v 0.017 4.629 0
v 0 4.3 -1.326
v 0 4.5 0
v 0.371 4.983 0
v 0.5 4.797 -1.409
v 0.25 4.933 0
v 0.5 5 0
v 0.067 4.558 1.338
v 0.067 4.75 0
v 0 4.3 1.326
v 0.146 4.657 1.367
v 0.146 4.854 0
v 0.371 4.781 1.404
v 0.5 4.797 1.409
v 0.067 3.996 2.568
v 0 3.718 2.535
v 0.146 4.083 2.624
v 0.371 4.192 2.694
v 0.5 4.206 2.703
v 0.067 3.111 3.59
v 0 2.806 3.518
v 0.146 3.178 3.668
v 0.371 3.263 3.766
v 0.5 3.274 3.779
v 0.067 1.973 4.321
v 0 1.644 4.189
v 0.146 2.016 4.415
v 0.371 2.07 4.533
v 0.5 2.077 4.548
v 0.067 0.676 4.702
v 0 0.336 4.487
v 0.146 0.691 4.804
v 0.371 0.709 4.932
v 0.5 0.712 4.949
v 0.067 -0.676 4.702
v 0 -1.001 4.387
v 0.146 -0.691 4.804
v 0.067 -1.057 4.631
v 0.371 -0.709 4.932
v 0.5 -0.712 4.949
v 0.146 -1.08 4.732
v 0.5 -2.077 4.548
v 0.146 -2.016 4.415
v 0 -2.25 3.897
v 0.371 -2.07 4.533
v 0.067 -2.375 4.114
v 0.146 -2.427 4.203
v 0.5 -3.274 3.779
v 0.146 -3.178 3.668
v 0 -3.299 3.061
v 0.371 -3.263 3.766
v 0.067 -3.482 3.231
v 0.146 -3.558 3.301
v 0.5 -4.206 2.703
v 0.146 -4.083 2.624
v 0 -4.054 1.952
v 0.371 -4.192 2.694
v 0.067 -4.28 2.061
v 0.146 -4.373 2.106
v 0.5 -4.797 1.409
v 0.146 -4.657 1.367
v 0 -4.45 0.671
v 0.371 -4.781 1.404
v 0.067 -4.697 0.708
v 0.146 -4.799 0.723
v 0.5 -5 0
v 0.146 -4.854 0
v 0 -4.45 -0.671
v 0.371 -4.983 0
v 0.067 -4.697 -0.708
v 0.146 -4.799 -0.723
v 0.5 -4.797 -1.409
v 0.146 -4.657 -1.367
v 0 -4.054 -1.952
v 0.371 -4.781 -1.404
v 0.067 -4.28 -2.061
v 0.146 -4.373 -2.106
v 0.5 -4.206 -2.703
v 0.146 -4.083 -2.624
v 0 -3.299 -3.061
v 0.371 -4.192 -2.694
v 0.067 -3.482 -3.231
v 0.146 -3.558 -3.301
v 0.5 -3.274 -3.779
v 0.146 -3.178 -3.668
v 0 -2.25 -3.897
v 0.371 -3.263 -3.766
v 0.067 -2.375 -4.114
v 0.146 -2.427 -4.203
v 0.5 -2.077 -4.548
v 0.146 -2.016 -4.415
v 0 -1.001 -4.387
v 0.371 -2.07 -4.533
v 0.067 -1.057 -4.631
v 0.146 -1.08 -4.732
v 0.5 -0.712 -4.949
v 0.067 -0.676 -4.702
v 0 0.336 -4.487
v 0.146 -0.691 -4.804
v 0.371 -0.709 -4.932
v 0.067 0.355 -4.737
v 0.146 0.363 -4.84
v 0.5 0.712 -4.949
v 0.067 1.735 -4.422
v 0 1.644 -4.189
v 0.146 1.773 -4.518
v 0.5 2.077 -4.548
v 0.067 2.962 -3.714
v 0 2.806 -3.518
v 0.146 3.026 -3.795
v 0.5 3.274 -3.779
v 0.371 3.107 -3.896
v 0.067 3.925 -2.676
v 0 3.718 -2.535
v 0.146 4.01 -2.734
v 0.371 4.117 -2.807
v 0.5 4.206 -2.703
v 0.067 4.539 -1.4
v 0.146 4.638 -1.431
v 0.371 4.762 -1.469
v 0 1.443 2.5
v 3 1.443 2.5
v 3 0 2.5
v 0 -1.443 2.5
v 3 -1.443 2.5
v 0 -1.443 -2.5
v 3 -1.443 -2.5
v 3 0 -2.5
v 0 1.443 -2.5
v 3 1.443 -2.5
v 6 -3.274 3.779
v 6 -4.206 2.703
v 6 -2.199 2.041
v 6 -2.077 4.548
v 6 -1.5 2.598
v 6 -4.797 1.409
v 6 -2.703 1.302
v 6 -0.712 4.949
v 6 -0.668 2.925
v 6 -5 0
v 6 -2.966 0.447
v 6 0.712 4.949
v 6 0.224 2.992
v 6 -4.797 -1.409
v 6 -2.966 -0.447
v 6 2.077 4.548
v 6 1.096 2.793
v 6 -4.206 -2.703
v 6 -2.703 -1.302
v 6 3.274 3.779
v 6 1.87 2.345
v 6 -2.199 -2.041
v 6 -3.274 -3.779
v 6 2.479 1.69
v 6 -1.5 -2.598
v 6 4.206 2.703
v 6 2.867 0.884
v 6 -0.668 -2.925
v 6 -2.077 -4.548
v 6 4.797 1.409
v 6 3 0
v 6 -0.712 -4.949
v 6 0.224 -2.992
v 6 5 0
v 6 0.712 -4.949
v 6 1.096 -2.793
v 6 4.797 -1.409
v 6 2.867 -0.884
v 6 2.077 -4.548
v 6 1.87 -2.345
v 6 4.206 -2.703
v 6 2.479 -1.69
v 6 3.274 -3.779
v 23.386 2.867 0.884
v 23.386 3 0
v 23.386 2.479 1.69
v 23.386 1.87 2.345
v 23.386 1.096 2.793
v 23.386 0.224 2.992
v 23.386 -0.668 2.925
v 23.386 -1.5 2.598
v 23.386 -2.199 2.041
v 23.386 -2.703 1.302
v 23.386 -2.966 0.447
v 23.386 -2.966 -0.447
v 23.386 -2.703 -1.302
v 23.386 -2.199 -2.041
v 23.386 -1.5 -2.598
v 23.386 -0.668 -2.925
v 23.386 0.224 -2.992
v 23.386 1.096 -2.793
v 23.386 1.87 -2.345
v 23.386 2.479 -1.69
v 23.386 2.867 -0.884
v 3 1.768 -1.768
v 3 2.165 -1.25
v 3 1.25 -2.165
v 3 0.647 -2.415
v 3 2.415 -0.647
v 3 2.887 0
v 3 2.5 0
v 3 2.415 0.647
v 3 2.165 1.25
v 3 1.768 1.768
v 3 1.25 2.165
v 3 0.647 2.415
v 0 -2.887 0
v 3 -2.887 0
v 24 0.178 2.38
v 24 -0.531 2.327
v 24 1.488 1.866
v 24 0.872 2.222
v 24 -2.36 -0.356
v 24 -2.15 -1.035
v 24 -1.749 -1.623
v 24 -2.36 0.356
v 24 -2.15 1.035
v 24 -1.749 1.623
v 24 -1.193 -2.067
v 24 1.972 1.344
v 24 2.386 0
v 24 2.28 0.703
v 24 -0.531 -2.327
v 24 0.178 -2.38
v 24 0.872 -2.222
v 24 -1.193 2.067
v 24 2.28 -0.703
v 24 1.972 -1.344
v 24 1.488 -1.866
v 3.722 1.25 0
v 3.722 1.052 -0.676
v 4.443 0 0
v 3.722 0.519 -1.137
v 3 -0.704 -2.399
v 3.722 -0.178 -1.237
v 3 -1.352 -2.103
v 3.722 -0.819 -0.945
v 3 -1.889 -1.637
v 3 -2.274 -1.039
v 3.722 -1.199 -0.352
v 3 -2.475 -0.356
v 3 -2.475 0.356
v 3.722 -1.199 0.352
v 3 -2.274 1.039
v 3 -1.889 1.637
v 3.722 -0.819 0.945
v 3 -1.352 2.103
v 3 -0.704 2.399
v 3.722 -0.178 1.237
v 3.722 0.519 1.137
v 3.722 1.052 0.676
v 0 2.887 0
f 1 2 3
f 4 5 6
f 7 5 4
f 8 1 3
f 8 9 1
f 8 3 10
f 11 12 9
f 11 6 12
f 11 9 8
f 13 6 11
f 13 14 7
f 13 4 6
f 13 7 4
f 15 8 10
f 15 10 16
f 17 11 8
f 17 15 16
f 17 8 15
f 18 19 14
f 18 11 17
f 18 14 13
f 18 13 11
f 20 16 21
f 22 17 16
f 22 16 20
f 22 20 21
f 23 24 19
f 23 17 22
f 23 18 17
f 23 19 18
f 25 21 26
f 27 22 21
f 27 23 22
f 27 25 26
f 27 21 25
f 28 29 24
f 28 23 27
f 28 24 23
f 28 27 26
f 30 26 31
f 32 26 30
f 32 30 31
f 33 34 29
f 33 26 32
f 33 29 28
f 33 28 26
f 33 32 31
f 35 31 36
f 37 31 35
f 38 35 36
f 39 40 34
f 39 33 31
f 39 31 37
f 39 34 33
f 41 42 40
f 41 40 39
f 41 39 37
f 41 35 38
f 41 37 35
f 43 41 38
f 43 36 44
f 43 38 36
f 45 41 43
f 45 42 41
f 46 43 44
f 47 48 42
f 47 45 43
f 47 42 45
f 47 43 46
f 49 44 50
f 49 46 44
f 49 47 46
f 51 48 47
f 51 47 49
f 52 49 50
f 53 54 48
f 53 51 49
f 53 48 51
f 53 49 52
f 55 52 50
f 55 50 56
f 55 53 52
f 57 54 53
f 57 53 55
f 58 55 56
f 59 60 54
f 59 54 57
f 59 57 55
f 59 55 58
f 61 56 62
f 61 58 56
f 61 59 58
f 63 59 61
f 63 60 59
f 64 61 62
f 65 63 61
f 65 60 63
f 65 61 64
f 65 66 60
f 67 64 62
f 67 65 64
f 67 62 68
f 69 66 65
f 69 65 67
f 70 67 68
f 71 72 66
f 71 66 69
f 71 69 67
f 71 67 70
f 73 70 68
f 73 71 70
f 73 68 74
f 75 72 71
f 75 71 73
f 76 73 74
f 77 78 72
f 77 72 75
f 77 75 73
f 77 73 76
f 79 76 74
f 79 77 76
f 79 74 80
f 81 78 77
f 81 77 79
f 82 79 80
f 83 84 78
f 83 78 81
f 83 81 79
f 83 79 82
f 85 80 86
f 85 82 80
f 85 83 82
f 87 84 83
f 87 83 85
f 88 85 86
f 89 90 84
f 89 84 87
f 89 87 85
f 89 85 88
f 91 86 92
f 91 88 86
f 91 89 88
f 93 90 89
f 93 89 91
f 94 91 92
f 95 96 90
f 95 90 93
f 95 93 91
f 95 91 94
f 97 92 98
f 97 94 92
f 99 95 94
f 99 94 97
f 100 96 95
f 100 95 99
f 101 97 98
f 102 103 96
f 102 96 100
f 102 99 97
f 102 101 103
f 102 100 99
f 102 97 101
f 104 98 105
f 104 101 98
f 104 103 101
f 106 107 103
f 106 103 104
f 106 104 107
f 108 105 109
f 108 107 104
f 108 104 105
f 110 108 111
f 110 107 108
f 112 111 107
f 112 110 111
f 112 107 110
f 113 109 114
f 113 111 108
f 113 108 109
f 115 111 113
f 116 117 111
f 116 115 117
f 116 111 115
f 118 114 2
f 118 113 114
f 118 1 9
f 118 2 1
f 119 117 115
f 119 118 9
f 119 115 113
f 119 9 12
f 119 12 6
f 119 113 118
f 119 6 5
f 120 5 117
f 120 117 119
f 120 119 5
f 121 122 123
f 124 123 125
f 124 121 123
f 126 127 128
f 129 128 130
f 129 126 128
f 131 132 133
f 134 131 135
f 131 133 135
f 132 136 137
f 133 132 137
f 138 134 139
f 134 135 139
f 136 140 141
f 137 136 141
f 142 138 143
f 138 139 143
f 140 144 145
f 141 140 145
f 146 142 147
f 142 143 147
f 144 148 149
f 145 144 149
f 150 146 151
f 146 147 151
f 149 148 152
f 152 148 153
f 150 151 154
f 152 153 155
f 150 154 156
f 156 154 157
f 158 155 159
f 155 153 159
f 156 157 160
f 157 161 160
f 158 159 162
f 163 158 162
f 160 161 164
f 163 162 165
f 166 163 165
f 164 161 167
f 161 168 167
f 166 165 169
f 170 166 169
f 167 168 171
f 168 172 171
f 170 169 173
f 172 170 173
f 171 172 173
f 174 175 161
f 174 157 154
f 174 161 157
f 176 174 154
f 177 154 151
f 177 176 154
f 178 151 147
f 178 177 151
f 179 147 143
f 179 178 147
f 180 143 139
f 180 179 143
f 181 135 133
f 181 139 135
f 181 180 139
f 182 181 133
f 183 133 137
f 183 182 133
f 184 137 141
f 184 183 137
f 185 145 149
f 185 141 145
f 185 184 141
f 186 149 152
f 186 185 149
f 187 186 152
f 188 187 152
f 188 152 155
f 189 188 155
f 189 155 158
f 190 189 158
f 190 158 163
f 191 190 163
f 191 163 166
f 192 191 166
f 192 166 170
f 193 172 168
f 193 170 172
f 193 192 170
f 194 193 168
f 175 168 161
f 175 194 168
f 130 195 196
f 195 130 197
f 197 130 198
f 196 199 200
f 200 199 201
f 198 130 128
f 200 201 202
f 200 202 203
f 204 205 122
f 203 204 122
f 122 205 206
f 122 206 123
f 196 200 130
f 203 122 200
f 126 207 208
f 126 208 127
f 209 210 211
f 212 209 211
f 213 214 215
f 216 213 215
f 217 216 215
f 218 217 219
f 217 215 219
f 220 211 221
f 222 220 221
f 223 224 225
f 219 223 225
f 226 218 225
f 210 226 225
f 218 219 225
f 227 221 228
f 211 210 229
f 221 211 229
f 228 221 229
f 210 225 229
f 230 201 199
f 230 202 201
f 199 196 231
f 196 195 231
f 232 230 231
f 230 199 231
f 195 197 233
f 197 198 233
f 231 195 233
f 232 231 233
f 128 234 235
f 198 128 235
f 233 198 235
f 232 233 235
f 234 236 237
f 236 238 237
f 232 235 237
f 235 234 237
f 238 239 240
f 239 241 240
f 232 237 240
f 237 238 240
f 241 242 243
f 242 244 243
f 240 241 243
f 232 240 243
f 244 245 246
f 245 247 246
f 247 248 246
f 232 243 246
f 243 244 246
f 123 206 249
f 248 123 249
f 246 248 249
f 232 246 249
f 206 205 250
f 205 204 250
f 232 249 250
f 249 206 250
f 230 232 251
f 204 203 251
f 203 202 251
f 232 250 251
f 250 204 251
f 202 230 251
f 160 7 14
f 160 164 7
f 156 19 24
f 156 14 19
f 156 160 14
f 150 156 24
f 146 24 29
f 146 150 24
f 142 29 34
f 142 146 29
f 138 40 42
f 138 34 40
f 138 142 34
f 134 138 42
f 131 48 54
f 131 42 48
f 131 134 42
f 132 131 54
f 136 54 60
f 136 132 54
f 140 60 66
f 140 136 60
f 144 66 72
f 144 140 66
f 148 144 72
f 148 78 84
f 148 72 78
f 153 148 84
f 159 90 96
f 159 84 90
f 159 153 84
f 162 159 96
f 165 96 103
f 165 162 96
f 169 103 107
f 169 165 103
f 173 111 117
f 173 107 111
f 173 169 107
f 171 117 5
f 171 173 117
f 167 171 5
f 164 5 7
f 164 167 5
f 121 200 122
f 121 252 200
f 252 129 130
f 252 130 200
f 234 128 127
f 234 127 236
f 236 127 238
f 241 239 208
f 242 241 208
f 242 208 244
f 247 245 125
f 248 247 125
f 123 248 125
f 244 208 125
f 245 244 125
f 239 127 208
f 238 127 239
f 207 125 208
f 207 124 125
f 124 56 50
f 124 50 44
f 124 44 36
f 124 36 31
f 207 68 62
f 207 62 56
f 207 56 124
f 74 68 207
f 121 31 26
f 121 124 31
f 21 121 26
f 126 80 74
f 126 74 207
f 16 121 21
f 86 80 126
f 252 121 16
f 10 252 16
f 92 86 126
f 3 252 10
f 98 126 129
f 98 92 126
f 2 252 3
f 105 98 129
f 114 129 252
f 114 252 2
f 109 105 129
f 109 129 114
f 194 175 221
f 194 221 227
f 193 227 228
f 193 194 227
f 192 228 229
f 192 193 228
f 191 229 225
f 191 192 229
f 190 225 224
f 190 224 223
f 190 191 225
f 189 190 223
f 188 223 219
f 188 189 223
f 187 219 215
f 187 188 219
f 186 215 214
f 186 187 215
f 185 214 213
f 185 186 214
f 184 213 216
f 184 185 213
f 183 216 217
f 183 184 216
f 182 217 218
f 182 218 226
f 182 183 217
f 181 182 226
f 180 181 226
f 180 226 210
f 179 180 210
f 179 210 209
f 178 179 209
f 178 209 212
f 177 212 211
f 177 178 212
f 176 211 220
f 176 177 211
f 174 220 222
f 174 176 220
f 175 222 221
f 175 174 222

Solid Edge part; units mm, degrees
sketch "Sketch1" plane through (0, 0, 0) normal (0, 0, 1) x (1, 0, 0)
  line L0 (0, 0) -> (0, 4.5)
  arc A0 (0, 4.5) -> (0.5, 5) centre (0.5, 4.5) cw
  line L1 (0.5, 5) -> (6, 5)
  line L2 (6, 5) -> (6, 3)
  line L3 (6, 3) -> (23.3865, 3)
  line L4 (23.3865, 3) -> (24, 2.3865)
  line L5 (24, 2.3865) -> (24, 0)
  line L6 (24, 0) -> (0, 0)
revolve "RevolvedProtrusion1" add sketch "Sketch1" angle 360 about axis through (24, 0, 0) along (-1, 0, 0)
cosmetic_thread "Thread1" size "M6"
sketch "Sketch2" plane through (0, 0, 0) normal (1, 0, 0) x (0, 1, 0)
  line L0 (-1.4434, 2.5) -> (-2.8868, 0)
  line L1 (-2.8868, 0) -> (-1.4434, -2.5)
  line L2 (-1.4434, -2.5) -> (1.4434, -2.5)
  line L3 (1.4434, -2.5) -> (2.8868, 0)
  line L4 (2.8868, 0) -> (1.4434, 2.5)
  line L5 (1.4434, 2.5) -> (-1.4434, 2.5)
extrude "Cutout1" cut sketch "Sketch2" along normal blind 3
sketch "Sketch3" plane through (0, 0, 0) normal (0, 0, 1) x (1, 0, 0)
  line L0 (3, 0) -> (3, 2.5)
  line L1 (3, 2.5) -> (4.4434, 0)
  line L2 (4.4434, 0) -> (3, 0)
revolve "RevolvedCutout1" cut sketch "Sketch3" angle 360 about axis through (4.4434, 0, 0) along (-1, 0, 0)
properties part number "07160-206X18"
